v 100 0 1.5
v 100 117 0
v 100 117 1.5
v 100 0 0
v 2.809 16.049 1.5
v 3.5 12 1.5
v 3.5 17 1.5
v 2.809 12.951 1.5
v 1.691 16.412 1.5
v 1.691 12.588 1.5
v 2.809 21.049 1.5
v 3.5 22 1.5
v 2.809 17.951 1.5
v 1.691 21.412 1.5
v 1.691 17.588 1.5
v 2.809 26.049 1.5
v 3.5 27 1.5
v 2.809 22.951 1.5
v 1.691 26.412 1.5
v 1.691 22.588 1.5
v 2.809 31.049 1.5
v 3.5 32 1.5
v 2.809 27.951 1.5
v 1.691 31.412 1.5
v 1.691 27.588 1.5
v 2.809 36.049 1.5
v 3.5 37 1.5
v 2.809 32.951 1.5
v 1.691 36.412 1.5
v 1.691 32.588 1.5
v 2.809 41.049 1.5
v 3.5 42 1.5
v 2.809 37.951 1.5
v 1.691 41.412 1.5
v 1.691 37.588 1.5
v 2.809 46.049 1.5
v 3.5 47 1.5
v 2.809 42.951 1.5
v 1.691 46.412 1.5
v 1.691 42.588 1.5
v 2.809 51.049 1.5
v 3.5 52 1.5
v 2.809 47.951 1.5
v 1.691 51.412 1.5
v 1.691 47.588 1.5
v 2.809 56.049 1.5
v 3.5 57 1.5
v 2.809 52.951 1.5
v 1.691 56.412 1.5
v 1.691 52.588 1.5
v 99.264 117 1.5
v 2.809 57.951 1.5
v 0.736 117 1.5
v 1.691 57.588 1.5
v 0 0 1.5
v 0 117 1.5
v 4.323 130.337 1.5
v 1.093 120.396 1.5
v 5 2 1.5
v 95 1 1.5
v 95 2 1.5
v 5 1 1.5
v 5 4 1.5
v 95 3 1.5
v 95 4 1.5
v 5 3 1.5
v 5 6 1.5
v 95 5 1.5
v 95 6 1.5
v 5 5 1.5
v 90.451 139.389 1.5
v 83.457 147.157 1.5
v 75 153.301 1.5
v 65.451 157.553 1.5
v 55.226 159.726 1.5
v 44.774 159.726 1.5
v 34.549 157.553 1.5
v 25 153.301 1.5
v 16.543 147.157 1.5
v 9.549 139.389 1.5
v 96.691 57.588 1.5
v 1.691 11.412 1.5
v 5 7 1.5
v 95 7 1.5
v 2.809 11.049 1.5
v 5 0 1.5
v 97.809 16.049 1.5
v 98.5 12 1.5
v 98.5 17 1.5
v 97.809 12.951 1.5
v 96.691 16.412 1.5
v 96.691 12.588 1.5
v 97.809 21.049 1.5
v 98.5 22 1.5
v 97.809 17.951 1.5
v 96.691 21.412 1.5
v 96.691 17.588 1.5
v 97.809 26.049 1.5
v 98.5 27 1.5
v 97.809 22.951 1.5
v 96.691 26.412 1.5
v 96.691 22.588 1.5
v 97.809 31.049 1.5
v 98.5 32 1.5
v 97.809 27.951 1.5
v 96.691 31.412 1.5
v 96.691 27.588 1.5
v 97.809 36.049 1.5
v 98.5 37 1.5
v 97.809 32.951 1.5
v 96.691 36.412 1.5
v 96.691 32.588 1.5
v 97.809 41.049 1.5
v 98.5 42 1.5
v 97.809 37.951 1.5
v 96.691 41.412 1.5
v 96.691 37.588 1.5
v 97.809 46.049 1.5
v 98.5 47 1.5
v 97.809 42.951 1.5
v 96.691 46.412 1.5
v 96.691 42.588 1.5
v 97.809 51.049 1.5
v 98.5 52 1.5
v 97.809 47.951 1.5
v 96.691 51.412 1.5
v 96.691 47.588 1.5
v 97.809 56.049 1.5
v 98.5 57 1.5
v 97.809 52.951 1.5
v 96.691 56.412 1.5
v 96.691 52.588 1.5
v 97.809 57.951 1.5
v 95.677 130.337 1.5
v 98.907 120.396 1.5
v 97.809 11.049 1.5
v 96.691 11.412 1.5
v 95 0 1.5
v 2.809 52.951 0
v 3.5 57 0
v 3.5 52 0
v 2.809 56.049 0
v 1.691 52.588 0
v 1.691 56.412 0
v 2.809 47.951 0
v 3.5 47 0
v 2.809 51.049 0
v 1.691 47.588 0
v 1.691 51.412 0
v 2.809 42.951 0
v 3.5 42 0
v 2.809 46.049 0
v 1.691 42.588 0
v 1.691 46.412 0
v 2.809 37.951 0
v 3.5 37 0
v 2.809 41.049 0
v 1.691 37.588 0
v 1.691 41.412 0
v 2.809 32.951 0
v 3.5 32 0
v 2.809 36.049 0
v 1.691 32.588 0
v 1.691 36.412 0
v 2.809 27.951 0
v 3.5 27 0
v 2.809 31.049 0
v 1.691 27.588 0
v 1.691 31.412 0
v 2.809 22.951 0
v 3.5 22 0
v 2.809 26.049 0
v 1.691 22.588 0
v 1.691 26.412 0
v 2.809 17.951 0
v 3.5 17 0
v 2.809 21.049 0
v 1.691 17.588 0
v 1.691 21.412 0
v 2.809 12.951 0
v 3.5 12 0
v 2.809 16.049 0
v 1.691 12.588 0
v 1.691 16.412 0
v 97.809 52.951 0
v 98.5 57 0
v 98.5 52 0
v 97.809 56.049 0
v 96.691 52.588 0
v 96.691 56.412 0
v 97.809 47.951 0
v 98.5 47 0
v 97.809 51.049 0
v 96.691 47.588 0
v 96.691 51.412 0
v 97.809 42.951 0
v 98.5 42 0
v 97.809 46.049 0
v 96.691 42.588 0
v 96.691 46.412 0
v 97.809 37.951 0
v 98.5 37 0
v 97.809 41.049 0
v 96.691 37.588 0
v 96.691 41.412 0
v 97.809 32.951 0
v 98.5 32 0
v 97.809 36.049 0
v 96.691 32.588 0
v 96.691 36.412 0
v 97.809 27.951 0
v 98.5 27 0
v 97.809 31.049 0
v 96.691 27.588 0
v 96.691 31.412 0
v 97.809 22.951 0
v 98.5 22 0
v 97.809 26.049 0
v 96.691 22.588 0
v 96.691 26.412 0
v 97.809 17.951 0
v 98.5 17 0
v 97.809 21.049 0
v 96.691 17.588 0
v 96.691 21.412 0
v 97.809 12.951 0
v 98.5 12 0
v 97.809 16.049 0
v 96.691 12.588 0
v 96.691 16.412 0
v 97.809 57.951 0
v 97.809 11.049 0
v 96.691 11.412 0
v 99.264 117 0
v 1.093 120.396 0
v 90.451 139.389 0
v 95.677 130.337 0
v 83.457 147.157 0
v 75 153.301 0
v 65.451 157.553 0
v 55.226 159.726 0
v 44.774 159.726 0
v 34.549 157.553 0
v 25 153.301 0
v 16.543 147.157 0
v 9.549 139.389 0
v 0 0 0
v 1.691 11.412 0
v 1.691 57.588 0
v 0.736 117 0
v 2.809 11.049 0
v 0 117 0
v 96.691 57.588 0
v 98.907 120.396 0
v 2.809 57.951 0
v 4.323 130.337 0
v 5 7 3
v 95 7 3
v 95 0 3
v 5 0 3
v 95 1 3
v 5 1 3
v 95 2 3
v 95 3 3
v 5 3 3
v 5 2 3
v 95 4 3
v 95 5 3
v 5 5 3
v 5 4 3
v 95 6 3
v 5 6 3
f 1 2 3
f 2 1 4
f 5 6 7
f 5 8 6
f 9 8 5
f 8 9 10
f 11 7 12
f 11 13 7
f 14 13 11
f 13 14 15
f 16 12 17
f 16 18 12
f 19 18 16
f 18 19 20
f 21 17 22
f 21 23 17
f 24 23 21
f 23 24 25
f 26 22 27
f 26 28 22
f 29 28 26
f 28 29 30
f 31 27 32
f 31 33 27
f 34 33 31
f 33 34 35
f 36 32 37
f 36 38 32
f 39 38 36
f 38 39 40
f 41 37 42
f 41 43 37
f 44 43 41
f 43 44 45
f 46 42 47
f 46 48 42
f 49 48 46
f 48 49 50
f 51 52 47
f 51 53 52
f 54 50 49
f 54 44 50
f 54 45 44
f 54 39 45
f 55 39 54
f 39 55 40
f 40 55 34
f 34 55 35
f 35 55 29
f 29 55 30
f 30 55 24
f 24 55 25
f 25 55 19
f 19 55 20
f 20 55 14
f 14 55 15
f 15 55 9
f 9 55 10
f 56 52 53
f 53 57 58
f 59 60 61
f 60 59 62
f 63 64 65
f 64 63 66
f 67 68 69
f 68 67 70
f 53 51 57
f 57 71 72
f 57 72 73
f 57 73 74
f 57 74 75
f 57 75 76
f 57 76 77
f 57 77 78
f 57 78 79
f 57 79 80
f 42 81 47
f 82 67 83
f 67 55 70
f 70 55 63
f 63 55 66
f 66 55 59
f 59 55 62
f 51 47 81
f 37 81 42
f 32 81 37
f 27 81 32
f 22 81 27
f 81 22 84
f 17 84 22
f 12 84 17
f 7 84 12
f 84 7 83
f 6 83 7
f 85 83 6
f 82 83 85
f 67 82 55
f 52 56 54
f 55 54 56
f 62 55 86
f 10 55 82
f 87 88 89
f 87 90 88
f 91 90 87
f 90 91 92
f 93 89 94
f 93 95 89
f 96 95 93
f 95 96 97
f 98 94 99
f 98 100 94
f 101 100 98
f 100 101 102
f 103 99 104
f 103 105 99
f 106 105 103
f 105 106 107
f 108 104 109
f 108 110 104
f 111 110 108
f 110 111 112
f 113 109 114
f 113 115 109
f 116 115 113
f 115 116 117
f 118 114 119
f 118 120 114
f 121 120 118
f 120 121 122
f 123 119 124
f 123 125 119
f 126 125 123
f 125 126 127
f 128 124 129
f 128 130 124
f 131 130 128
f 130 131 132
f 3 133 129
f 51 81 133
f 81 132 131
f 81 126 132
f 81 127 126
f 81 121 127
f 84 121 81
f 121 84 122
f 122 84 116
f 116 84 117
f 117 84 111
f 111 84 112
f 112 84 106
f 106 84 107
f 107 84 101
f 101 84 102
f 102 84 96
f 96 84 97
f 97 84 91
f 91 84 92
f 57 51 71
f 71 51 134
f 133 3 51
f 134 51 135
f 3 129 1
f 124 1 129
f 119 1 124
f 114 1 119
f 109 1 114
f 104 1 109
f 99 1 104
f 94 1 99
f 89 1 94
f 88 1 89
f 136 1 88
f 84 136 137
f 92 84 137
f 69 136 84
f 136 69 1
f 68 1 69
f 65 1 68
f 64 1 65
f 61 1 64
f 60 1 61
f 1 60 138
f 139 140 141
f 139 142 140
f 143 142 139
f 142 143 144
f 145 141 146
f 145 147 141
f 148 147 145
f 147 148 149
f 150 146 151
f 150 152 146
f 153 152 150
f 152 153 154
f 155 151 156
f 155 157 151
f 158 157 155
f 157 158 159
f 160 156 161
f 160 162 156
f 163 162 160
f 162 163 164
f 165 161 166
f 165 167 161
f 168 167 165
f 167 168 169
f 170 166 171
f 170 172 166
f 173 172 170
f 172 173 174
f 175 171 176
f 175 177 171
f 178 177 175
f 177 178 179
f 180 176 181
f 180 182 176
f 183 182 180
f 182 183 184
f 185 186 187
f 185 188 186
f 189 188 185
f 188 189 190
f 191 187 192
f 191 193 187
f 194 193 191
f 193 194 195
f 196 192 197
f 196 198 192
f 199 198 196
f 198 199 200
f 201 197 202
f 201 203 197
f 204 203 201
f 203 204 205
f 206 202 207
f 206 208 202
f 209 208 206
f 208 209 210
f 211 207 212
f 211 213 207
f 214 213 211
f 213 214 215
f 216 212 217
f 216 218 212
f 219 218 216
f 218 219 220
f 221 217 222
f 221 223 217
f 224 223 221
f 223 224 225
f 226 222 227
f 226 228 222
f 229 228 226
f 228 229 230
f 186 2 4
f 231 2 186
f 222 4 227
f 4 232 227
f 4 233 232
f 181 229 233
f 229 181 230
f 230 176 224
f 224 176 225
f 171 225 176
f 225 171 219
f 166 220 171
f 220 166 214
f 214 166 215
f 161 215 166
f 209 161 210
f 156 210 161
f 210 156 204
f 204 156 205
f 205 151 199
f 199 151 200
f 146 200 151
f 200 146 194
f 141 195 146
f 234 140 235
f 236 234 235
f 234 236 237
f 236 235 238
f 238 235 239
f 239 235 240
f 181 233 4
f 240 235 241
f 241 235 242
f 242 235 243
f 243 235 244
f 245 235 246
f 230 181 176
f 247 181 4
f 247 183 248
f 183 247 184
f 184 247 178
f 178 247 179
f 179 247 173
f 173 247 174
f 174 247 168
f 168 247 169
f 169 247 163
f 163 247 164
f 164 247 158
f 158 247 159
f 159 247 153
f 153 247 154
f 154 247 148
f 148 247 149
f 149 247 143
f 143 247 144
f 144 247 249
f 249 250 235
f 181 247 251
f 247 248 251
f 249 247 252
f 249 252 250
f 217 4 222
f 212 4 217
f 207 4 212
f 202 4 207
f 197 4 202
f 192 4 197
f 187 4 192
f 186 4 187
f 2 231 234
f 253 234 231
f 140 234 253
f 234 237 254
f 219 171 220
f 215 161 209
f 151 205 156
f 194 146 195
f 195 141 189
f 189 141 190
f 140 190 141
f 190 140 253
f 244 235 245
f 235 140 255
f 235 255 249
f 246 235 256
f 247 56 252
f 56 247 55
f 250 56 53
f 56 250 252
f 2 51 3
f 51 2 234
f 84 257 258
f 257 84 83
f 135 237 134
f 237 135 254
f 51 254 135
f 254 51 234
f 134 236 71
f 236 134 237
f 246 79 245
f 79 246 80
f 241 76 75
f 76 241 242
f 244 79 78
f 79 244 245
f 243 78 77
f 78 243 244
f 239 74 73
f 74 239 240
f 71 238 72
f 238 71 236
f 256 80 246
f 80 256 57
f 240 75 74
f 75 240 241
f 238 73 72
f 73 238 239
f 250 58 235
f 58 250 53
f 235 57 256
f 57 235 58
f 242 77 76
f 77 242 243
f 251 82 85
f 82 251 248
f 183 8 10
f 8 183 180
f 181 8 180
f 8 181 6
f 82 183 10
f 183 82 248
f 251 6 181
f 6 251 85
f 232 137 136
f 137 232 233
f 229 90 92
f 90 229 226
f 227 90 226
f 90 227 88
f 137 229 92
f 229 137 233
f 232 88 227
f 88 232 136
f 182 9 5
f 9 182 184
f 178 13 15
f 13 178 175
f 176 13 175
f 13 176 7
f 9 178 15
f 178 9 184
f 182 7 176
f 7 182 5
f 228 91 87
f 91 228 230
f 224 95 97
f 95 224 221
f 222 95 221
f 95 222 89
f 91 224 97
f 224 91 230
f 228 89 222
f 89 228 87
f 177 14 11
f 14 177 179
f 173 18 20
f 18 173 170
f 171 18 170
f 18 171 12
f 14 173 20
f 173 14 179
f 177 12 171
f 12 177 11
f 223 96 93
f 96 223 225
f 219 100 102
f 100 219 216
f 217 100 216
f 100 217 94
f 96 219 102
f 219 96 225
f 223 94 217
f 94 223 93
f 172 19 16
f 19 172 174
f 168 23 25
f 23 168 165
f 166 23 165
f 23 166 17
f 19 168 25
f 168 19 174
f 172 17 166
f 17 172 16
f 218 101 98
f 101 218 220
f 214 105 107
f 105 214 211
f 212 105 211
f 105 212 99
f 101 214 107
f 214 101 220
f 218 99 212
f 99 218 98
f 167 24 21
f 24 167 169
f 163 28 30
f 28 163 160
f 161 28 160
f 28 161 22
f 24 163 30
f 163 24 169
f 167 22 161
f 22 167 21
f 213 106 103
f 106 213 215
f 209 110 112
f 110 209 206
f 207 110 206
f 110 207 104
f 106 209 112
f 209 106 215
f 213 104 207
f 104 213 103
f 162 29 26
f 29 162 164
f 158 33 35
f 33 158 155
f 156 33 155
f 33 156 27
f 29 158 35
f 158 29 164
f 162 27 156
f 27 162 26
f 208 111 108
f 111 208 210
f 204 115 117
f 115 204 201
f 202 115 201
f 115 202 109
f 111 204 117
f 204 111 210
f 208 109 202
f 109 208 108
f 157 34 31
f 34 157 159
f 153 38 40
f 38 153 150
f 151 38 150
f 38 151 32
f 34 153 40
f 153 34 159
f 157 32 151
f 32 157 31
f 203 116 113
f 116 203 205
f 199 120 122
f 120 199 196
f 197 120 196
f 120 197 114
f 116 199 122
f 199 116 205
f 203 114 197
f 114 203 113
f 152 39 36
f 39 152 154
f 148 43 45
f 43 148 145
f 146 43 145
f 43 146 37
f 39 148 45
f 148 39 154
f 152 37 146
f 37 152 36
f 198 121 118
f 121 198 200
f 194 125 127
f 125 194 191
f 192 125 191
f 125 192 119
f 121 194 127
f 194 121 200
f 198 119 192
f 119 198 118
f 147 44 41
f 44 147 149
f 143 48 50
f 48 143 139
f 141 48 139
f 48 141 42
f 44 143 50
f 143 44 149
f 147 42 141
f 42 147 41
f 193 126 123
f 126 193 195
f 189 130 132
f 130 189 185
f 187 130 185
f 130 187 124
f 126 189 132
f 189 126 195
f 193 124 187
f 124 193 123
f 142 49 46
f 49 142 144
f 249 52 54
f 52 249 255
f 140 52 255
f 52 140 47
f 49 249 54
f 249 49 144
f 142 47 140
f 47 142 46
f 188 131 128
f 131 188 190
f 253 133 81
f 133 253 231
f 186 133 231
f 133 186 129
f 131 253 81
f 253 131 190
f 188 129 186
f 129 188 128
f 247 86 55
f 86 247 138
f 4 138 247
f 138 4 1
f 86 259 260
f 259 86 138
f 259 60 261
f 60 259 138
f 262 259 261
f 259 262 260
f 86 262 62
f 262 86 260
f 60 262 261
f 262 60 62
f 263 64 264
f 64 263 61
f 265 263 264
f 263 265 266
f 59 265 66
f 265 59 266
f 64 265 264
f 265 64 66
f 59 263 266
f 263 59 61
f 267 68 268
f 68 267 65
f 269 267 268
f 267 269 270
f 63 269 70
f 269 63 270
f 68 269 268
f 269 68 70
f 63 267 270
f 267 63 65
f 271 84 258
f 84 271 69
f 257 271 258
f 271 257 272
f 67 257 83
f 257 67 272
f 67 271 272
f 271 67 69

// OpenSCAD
/*
cube(size=[75, 75, 2]);
translate([37.5,75,0]) cylinder(h=2, r=37);
*/

Lx = 2.5;
Rx = 97.5;


//zipper strip (with 4 sections)
cube(size=[100,7,1.5]); //x=100mm so that 5mm on each side of it can 
				      //be fused together, so the opening is only 90mm
	//1
translate([5,0,1.5]) cube(size=[90,1,1.5]);
	//2
translate([5,2,1.5]) cube(size=[90,1,1.5]);
	//3
translate([5,4,1.5]) cube(size=[90,1,1.5]);
	//4
translate([5,6,1.5]) cube(size=[90,1,1.5]);

//body
module body(){
	translate([0,7,0]) cube(size=[100,110,1.5]);
	translate([50,110,0]) cylinder(h=1.5, r=50);
}

//body();

//holes? for attaching two pieces together (sewing)?
module hole(x,y){
	translate([x,y,-1])
	cylinder(h=3, r=1);
}


//with holes?
difference(){
	body();

	hole(Lx, 12);
	hole(Rx, 12);
	hole(Lx, 17);
	hole(Rx, 17);
	hole(Lx, 22);
	hole(Rx, 22);
	hole(Lx, 27);
	hole(Rx, 27);
	hole(Lx, 32);
	hole(Rx, 32);
	hole(Lx, 37);
	hole(Rx, 37);
	hole(Lx, 42);
	hole(Rx, 42);
	hole(Lx, 47);
	hole(Rx, 47);
	hole(Lx, 52);
	hole(Rx, 52);
	hole(Lx, 57);
	hole(Rx, 57);


}
